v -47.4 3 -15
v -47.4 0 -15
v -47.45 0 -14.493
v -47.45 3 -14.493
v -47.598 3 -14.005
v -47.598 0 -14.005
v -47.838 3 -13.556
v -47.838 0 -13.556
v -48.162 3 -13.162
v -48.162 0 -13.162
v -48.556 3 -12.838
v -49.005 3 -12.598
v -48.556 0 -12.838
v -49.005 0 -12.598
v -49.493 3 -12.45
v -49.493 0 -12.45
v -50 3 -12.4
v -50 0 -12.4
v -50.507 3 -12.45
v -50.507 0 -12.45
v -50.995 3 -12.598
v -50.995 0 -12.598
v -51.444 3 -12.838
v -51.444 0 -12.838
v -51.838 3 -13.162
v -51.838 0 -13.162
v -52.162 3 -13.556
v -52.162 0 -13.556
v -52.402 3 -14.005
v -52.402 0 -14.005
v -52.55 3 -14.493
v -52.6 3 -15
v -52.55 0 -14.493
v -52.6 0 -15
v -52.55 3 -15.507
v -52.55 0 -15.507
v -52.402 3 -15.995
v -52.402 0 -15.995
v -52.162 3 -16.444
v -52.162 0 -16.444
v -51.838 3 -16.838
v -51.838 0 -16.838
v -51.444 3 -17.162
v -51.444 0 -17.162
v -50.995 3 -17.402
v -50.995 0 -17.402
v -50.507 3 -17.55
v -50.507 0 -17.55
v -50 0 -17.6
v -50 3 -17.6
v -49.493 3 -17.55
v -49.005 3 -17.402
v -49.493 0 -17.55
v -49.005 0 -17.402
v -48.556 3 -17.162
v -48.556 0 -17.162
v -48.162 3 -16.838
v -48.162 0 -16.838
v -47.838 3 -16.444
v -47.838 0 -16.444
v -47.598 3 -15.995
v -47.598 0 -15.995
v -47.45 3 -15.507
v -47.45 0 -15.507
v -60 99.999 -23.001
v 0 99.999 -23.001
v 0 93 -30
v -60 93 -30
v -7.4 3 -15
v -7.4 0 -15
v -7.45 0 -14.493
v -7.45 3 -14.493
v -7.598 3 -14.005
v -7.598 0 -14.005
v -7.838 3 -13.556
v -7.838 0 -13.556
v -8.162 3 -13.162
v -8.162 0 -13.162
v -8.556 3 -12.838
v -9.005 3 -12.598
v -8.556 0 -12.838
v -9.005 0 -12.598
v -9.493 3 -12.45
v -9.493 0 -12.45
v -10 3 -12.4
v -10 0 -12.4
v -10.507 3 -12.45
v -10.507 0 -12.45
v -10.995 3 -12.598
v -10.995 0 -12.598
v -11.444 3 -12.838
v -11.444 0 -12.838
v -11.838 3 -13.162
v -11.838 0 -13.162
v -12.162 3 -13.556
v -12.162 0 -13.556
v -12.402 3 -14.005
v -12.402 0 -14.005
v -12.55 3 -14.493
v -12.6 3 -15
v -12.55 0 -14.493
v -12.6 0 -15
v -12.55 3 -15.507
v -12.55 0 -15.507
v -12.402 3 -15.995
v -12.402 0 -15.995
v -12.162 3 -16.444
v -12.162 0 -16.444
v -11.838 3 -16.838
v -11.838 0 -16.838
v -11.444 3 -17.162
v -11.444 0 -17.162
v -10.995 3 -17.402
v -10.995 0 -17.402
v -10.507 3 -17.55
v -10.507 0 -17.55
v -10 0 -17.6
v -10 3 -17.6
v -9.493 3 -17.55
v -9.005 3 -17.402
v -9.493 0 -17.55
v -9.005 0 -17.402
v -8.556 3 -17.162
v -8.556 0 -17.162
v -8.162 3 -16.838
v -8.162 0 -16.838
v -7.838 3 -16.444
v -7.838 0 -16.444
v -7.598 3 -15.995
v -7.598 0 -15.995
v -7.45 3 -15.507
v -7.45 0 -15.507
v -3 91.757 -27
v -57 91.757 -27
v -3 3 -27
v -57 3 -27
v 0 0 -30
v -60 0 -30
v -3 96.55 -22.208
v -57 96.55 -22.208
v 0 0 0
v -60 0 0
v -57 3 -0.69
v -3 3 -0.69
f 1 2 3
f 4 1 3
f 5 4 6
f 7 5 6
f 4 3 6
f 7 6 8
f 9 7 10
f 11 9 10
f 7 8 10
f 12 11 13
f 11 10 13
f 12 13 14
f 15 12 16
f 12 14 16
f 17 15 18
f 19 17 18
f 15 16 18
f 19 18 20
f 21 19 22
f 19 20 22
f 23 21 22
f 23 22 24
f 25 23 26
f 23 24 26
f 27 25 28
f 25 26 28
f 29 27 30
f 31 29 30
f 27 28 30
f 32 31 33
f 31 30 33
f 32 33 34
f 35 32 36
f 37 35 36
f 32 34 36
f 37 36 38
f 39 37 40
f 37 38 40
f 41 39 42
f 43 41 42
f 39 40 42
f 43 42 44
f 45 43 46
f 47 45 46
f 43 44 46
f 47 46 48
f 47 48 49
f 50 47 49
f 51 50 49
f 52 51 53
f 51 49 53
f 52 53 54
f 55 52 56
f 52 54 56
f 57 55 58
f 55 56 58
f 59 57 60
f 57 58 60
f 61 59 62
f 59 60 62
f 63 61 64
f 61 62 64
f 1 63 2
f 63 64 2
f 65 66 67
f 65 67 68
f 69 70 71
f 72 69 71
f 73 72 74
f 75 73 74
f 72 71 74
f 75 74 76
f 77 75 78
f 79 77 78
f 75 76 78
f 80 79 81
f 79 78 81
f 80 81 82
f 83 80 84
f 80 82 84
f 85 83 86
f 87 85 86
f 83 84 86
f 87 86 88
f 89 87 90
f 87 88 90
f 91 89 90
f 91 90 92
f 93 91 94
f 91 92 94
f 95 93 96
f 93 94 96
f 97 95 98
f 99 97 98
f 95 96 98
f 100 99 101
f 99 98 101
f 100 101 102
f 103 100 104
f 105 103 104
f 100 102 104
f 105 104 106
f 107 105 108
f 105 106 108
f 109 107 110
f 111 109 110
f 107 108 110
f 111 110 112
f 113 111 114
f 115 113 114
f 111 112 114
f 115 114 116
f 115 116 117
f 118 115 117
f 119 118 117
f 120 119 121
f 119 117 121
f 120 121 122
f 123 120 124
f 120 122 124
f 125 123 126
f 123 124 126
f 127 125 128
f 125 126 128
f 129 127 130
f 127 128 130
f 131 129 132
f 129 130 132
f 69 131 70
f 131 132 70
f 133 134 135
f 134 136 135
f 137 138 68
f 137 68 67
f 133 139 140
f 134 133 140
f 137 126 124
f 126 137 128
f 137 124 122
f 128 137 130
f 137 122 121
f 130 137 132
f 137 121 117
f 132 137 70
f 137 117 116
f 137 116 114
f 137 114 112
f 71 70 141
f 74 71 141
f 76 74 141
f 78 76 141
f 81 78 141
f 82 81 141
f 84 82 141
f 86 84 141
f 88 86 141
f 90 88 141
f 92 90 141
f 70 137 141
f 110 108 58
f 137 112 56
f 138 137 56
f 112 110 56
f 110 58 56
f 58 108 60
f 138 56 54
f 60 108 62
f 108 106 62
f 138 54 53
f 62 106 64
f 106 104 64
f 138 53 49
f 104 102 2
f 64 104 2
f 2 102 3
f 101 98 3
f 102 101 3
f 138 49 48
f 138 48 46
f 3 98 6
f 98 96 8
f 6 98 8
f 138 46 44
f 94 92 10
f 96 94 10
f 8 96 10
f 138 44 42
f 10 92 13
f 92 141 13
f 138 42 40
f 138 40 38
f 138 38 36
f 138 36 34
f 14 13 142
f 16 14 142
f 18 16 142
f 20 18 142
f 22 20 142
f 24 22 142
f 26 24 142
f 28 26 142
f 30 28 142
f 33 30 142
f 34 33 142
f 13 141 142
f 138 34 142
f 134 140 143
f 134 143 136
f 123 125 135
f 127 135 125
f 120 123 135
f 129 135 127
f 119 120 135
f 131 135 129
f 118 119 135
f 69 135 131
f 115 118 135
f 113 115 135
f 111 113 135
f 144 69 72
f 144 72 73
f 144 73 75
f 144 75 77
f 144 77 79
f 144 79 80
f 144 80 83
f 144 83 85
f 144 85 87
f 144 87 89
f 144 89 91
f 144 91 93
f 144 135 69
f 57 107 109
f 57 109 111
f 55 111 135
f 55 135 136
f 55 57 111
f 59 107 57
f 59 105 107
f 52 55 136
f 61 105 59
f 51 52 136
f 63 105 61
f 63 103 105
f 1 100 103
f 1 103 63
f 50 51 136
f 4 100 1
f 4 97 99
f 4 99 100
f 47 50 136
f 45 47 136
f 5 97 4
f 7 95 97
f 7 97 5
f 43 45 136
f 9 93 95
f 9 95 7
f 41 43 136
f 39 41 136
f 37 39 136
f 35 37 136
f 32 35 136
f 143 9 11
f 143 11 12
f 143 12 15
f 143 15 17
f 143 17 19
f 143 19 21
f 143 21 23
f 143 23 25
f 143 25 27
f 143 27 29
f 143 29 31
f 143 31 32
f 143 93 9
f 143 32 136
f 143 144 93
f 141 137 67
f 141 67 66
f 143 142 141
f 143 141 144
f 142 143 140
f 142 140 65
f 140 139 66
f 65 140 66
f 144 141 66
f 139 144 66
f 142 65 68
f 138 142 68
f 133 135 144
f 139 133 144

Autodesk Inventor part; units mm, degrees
ref_plane "YZ Plane" through (0, 0, 0) normal (1, 0, 0) x (0, 1, 0)
ref_plane "XZ Plane" through (0, 0, 0) normal (0, 1, 0) x (-1, 0, 0)
ref_plane "XY Plane" through (0, 0, 0) normal (0, 0, 1) x (1, 0, 0)
sketch "Sketch4" plane through (0, 0, 0) normal (0, 1, 0) x (-1, 0, 0)
  line L0 (0, 0) -> (60, 0)
  line L1 (60, 0) -> (60, -30)
  line L2 (60, -30) -> (0, -30)
  line L3 (0, -30) -> (0, 0)
  dimension "d15" = 60
  dimension "d16" = 30
extrude "Extrusion4" add sketch "Sketch4" along normal blind 100
chamfer "Chamfer1" distance 7 angle 45 1 edges at (-30, 100, -30)
sketch "Sketch6" plane through (0, 0, 0) normal (1, 0, 0) x (0, 0, -1)
  line L0 (30, 0) -> (30, 93) projected
  line L1 (0, 0) -> (0, 100) projected
  line L2 (30, 0) -> (0, 0)
  line L3 (0, 0) -> (0, 100)
  line L4 (0, 100) -> (30, 100)
  line L5 (30, 100) -> (30, 0)
  line L6 (0, 0) -> (23.0011, 100)
extrude "Extrusion5" cut sketch "Sketch6" against normal blind 100 contours L1 L4 L6
shell "Shell2" thickness 3 removed faces 1 at (-40, 66.6661, -15.3339)
sketch "Sketch8" plane through (0, 0, 0) normal (0, -1, 0) x (1, 0, 0)
  line L0 (0, -30) -> (-60, -30) projected
  line L1 (0, 0) -> (-60, 0)
  line L2 (-60, 0) -> (-60, -30)
  line L3 (-60, -30) -> (0, -30)
  line L4 (0, -30) -> (0, 0)
  line L5 (0, -23.0009) -> (0, 0) projected
  line L6 (0, 0) -> (0, -15)
  line L7 (0, -15) -> (-60, -15) construction
  line L8 (-30, 0) -> (-30, -30) construction
  line L9 (-30, -15) -> (-10, -15) construction
  circle A0 centre (-10, -15) radius 2.6
  line L10 (-30, -15) -> (-50, -15) construction
  circle A1 centre (-50, -15) radius 2.6
  dimension "d26" = 15
  dimension "d27" = 20
  dimension "d28" = 5.2
extrude "Extrusion6" cut sketch "Sketch8" against normal blind 20 contours A0 | A1
properties part number "Claw"
